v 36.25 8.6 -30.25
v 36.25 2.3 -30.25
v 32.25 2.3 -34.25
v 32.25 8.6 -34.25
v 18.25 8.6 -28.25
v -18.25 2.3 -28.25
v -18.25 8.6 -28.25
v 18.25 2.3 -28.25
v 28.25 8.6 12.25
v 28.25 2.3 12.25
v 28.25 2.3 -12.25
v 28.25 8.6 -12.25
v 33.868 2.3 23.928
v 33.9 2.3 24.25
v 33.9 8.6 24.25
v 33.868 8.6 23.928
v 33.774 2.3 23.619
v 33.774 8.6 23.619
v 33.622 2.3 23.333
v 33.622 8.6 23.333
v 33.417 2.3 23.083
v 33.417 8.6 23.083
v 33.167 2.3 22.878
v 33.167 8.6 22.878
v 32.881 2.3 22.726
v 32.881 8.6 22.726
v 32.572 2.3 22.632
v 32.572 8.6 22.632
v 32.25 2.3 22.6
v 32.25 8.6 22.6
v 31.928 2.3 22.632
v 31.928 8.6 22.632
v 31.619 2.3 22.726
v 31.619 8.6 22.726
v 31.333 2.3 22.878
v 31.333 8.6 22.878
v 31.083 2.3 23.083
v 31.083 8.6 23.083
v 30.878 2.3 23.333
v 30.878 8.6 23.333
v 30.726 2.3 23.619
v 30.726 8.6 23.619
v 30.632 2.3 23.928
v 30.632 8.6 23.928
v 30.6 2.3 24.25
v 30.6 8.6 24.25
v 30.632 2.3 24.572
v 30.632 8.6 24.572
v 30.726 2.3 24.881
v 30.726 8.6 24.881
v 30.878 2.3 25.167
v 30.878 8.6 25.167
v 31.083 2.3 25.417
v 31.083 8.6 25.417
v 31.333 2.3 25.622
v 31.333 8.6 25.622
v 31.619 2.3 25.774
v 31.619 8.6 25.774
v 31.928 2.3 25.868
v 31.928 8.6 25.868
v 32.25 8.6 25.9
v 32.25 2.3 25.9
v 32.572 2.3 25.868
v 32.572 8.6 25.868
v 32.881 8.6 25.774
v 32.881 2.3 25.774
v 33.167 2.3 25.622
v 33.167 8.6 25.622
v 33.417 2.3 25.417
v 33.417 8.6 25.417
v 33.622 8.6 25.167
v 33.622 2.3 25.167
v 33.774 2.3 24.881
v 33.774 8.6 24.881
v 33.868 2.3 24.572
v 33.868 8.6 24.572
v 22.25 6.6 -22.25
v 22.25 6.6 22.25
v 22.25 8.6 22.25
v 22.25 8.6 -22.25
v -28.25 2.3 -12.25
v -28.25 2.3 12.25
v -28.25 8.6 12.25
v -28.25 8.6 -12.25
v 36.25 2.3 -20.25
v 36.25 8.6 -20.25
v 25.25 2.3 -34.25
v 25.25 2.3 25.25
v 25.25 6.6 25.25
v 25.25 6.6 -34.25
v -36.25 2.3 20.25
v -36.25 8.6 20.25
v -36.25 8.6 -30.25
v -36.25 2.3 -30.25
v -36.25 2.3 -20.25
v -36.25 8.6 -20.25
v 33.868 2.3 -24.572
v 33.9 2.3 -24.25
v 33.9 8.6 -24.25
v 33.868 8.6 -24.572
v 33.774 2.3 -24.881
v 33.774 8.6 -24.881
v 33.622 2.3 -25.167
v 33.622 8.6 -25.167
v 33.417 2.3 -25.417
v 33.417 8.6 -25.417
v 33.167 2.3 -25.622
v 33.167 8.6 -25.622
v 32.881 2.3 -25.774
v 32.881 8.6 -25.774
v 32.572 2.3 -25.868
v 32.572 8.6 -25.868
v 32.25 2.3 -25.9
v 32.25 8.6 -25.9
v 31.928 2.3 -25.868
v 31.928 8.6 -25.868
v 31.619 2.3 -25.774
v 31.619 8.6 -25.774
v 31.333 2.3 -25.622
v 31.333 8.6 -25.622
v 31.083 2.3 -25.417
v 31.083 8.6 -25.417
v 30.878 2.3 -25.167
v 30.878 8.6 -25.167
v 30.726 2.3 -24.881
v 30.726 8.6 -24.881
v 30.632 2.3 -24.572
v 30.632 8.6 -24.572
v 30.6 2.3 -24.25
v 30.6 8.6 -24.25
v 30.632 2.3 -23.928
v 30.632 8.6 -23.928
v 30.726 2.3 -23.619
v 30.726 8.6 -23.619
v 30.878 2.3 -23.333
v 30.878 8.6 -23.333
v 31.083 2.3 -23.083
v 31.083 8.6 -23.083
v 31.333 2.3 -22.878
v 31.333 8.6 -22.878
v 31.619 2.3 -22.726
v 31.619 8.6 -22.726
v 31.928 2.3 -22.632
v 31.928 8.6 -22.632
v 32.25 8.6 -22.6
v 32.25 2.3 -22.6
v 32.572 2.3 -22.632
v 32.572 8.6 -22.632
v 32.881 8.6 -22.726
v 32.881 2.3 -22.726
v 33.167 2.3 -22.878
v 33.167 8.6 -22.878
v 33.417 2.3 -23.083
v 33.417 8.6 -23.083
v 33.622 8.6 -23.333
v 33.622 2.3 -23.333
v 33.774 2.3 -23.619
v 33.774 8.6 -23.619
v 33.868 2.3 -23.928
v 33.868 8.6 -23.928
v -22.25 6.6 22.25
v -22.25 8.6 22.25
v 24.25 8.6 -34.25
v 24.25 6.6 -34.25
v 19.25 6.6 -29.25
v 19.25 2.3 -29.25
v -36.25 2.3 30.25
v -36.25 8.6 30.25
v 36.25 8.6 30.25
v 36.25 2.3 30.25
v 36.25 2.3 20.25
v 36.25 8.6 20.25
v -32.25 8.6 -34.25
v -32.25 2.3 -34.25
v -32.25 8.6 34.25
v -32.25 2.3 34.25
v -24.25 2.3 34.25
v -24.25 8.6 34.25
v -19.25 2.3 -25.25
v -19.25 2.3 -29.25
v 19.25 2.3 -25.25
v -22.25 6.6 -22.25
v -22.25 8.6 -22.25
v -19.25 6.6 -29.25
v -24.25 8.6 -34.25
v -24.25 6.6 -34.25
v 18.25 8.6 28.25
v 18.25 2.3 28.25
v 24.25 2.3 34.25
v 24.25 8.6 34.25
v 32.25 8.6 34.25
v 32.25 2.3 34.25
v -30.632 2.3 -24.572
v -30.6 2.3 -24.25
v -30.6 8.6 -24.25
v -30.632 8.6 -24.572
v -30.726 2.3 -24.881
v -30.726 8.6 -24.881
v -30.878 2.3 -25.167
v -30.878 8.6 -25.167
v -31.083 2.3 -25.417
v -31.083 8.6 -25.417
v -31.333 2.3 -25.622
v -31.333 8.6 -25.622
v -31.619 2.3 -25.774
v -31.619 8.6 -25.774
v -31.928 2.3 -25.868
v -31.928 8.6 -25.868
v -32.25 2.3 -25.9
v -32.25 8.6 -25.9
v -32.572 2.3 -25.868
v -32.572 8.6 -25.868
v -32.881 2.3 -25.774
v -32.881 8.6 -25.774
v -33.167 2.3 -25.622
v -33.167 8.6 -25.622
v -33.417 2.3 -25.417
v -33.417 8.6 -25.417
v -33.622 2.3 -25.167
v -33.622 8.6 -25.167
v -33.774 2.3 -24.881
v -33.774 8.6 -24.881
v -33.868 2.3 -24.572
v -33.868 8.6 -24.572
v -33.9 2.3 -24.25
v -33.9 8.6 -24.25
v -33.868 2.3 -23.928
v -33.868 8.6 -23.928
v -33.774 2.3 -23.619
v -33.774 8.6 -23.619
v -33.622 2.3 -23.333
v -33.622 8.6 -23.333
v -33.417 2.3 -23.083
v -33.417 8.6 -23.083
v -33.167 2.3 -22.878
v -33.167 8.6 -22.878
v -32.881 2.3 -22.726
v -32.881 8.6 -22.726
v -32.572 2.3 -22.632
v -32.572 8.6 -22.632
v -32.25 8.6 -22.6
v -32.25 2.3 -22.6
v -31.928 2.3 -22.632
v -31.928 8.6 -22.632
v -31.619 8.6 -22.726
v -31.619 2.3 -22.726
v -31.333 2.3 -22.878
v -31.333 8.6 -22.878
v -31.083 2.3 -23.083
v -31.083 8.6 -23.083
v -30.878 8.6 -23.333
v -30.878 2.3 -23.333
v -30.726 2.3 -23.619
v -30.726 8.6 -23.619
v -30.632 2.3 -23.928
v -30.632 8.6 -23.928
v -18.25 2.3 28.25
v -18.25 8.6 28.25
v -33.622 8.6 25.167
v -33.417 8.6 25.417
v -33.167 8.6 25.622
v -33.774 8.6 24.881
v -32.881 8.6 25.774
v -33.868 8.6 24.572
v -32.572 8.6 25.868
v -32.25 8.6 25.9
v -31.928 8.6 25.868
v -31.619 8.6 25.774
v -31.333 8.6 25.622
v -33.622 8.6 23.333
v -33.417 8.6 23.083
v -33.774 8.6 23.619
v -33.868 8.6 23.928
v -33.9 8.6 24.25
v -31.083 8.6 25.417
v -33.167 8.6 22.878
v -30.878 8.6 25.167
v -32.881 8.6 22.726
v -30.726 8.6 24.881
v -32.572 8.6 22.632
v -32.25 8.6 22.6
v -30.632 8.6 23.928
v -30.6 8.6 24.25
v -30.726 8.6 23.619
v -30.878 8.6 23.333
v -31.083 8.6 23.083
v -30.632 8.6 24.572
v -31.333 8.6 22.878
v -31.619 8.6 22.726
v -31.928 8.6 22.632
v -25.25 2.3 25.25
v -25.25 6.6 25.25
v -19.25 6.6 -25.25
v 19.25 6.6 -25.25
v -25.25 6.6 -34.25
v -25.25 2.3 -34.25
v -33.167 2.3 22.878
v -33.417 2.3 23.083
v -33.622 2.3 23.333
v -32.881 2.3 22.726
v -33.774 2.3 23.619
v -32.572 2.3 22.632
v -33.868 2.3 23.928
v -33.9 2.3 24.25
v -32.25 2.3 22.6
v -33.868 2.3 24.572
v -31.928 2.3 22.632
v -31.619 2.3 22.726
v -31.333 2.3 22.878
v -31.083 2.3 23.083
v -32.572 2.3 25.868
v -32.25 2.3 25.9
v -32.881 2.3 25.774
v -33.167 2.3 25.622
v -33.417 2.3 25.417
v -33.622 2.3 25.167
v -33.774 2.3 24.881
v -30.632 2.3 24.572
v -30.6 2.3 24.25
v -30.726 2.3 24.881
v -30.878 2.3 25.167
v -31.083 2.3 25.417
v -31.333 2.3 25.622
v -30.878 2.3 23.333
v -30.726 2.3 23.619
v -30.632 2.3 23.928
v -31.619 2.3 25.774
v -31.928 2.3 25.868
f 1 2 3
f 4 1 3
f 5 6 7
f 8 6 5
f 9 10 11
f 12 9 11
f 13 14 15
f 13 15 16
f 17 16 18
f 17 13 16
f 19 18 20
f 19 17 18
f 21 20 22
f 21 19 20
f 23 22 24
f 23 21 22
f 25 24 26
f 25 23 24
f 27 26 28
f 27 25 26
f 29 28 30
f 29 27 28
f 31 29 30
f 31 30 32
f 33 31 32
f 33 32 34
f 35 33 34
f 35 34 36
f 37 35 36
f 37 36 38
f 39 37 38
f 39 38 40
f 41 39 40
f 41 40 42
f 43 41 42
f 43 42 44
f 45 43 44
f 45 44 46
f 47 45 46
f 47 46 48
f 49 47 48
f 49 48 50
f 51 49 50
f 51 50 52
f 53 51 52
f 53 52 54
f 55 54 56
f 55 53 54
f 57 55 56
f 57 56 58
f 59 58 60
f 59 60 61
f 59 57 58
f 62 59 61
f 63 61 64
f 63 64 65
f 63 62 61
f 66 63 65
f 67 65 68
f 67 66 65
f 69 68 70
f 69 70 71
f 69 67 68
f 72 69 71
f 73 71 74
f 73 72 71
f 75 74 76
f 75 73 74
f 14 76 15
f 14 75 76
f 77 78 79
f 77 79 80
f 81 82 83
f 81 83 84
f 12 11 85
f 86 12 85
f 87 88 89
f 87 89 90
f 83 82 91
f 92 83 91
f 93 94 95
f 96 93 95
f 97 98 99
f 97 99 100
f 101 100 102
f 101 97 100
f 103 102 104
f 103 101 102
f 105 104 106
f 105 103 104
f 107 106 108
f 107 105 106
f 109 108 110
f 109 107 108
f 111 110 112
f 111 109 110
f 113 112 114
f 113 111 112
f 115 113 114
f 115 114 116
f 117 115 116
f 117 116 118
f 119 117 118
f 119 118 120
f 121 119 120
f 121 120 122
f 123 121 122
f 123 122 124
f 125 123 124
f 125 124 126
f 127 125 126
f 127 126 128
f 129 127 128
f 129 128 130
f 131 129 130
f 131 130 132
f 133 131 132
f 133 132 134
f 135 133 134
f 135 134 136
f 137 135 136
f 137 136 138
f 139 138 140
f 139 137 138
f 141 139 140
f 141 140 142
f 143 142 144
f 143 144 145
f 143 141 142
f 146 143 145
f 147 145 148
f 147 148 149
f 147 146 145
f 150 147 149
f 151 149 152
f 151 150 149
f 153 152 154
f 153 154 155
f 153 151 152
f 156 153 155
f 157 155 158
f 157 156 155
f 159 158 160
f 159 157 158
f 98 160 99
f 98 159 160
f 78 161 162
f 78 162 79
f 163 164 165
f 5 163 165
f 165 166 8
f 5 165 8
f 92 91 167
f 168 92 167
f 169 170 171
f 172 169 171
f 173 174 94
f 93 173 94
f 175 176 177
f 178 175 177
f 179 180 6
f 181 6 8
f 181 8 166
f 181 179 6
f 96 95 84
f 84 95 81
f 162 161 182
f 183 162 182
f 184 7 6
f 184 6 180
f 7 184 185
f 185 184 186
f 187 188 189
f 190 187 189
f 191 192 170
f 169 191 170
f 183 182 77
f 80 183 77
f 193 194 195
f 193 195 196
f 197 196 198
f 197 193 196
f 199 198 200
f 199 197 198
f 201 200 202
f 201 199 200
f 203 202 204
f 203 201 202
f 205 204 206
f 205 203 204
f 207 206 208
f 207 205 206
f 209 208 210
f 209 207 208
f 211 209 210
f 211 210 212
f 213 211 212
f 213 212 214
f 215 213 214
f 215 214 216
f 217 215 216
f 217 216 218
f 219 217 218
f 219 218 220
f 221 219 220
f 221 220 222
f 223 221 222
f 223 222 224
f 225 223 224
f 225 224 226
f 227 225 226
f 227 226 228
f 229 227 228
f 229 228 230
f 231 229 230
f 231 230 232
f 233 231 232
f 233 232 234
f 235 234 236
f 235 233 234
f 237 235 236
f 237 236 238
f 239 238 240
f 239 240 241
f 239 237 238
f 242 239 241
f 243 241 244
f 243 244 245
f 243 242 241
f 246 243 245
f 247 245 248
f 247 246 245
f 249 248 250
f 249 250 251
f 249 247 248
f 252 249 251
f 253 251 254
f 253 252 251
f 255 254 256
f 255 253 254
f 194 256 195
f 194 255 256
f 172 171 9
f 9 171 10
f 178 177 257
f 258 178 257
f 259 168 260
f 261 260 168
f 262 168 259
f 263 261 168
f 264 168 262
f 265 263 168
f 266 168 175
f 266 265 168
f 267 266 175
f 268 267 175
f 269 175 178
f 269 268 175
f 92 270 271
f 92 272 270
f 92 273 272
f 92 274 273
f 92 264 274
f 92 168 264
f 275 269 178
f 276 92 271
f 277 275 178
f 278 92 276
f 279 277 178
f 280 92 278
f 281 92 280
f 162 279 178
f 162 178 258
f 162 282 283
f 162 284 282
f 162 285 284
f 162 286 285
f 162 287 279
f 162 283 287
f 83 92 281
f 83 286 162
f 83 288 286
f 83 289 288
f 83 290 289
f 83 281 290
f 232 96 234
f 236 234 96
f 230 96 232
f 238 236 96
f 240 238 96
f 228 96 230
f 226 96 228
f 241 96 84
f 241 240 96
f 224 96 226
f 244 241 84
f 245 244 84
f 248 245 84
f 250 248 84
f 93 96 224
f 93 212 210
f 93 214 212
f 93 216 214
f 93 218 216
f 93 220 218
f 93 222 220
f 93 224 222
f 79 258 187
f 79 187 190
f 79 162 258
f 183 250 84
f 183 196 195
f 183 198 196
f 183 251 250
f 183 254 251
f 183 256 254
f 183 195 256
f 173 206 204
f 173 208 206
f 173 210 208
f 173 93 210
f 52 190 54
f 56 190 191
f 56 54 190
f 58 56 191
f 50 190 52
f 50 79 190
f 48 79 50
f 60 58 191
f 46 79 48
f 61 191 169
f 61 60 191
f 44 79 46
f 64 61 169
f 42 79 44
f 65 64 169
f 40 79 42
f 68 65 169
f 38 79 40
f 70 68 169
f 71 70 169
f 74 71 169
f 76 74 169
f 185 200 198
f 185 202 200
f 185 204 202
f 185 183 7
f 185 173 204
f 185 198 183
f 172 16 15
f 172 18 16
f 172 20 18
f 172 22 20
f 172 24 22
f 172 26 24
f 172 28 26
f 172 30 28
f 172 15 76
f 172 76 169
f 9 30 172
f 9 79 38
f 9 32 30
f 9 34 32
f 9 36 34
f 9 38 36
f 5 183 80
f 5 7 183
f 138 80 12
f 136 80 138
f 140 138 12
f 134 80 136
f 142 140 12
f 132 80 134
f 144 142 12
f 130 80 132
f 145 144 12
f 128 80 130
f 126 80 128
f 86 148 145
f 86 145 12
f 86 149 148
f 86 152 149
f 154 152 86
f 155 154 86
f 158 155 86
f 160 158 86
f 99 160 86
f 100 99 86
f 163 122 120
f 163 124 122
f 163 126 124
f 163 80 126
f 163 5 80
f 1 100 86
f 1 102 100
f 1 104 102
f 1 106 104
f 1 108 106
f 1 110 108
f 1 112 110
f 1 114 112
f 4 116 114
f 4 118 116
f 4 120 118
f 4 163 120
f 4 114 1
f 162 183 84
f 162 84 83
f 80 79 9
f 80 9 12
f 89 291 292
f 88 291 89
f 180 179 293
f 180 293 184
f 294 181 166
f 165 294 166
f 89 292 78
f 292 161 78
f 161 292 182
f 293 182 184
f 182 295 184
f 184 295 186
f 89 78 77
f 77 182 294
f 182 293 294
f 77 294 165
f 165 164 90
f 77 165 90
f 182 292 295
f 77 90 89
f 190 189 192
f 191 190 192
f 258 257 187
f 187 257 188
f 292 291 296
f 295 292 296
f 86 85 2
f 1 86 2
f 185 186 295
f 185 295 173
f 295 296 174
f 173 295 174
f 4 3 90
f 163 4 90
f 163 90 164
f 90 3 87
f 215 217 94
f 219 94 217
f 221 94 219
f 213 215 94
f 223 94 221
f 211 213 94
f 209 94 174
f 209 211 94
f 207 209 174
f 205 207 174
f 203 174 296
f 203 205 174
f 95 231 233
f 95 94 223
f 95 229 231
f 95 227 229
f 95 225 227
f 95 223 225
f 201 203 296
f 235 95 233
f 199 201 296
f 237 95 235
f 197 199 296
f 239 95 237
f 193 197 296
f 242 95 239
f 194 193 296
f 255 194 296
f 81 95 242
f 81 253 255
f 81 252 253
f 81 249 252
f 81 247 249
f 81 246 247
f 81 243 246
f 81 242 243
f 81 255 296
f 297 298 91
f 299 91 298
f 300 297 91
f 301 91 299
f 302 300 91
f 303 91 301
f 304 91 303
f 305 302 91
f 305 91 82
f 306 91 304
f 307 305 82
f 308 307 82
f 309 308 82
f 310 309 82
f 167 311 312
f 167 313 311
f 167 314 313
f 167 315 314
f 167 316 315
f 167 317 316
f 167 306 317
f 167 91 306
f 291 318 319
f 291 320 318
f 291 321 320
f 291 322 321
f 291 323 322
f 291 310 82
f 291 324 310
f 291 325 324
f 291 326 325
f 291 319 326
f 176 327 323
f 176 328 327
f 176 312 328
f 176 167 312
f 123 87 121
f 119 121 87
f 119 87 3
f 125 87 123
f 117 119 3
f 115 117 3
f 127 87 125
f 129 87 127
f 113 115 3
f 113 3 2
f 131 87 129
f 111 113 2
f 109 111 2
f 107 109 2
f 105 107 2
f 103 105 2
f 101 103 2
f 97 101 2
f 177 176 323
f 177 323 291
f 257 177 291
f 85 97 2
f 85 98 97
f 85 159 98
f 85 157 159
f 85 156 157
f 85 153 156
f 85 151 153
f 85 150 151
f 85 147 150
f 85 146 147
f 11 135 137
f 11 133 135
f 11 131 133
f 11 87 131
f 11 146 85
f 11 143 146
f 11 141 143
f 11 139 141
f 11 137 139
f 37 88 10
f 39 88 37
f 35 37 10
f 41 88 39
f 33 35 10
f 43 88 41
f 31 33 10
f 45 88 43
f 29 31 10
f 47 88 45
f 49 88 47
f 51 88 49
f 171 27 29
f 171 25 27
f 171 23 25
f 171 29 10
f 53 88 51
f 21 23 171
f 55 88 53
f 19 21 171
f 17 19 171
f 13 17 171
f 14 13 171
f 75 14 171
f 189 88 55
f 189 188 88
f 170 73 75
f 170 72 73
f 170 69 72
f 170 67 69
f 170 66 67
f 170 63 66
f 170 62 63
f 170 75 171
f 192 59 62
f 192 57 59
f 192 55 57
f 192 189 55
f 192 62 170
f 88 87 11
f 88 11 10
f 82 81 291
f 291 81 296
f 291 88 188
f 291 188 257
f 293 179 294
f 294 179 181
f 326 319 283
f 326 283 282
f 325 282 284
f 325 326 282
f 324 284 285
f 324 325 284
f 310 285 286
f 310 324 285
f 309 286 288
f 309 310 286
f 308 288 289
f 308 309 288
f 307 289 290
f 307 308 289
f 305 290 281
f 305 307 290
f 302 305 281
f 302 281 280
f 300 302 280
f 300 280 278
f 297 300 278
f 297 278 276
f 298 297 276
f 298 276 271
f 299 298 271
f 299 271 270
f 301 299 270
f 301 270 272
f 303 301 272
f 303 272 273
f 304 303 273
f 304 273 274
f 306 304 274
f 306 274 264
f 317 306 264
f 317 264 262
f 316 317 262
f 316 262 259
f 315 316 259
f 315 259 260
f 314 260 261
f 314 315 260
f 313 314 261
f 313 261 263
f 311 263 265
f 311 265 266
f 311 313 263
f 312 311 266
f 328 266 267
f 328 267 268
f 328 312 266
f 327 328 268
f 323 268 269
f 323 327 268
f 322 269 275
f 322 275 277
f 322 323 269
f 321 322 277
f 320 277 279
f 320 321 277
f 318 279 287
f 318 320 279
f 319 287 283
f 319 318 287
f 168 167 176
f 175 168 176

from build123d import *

# Parameters (mm, degrees)
SKETCH1_W           = 56.5
SKETCH1_H           = 56.5
SKETCH1_W_2         = 50.5
SKETCH1_H_2         = 50.5
SKETCH1_R           = 1.65
BOSS_EXTRUDE1_DEPTH = 8.6
SKETCH2_W           = 50.5
SKETCH2_H           = 50.5
SKETCH2_W_2         = 44.5
SKETCH2_H_2         = 44.5
BOSS_EXTRUDE2_DEPTH = 2
BOSS_EXTRUDE3_START = 6.6
SKETCH4_W           = 50.5
SKETCH4_H           = 50.5
SKETCH4_W_2         = 44.5
SKETCH4_H_2         = 44.5
BOSS_EXTRUDE3_DEPTH = 2
CUT_EXTRUDE1_START  = 2
SKETCH5_W           = 6
SKETCH5_H           = 17.961455198
CUT_EXTRUDE1_DEPTH  = 4.6
SKETCH6_W           = 87.3205389
SKETCH6_H           = 82.15723747
CUT_EXTRUDE2_DEPTH  = 2.3


with BuildPart() as part:
    # Sketch1 → Boss-Extrude1 (new body)
    with BuildSketch(Plane(origin=(0, 0, 0), x_dir=(1, 0, 0), z_dir=(0, 1, 0))):
        Rectangle(SKETCH1_W, SKETCH1_H)
        Rectangle(SKETCH1_W_2, SKETCH1_H_2, mode=Mode.SUBTRACT)
        Polygon((-28.25, -28.25), (-28.25, -12.25), (-36.25, -20.25), (-36.25, -30.25), (-32.25, -34.25), (-24.25, -34.25), (-18.25, -28.25), align=None)
        with Locations((-32.25, -24.25)):
            Circle(SKETCH1_R, mode=Mode.SUBTRACT)
        Polygon((28.25, -28.25), (18.25, -28.25), (24.25, -34.25), (32.25, -34.25), (36.25, -30.25), (36.25, -20.25), (28.25, -12.25), align=None)
        with Locations((32.25, -24.25)):
            Circle(SKETCH1_R, mode=Mode.SUBTRACT)
        Polygon((24.25, 34.25), (18.25, 28.25), (28.25, 28.25), (28.25, 12.25), (36.25, 20.25), (36.25, 30.25), (32.25, 34.25), align=None)
        with Locations((32.25, 24.25)):
            Circle(SKETCH1_R, mode=Mode.SUBTRACT)
        Polygon((-36.25, 20.25), (-28.25, 12.25), (-28.25, 28.25), (-18.25, 28.25), (-24.25, 34.25), (-32.25, 34.25), (-36.25, 30.25), align=None)
        with Locations((-32.25, 24.25)):
            Circle(SKETCH1_R, mode=Mode.SUBTRACT)
    extrude(amount=BOSS_EXTRUDE1_DEPTH)

    # Sketch2 → Boss-Extrude2 (add)
    with BuildSketch(Plane(origin=(0, 0, 0), x_dir=(1, 0, 0), z_dir=(0, 1, 0))):
        Rectangle(SKETCH2_W, SKETCH2_H)
        Rectangle(SKETCH2_W_2, SKETCH2_H_2, mode=Mode.SUBTRACT)
    extrude(amount=BOSS_EXTRUDE2_DEPTH)

    # Sketch4 → Boss-Extrude3 (add)
    with BuildSketch(Plane(origin=(0, 0, 0), x_dir=(1, 0, 0), z_dir=(0, 1, 0)).offset(BOSS_EXTRUDE3_START)):
        Rectangle(SKETCH4_W, SKETCH4_H)
        Rectangle(SKETCH4_W_2, SKETCH4_H_2, mode=Mode.SUBTRACT)
    extrude(amount=BOSS_EXTRUDE3_DEPTH)

    # Sketch5 → Cut-Extrude1 (cut)
    with BuildSketch(Plane(origin=(0, 0, 0), x_dir=(1, 0, 0), z_dir=(0, 1, 0)).offset(CUT_EXTRUDE1_START)):
        with Locations((-22.25, 28.869783692)):
            Rectangle(SKETCH5_W, SKETCH5_H)
        with Locations((22.25, 28.869783692)):
            Rectangle(SKETCH5_W, SKETCH5_H)
    extrude(amount=CUT_EXTRUDE1_DEPTH, mode=Mode.SUBTRACT)

    # Sketch6 → Cut-Extrude2 (cut)
    with BuildSketch(Plane.XZ):
        with Locations((1.898272585, -1.518618068)):
            Rectangle(SKETCH6_W, SKETCH6_H)
    extrude(amount=-CUT_EXTRUDE2_DEPTH, mode=Mode.SUBTRACT)


solid = part.part
